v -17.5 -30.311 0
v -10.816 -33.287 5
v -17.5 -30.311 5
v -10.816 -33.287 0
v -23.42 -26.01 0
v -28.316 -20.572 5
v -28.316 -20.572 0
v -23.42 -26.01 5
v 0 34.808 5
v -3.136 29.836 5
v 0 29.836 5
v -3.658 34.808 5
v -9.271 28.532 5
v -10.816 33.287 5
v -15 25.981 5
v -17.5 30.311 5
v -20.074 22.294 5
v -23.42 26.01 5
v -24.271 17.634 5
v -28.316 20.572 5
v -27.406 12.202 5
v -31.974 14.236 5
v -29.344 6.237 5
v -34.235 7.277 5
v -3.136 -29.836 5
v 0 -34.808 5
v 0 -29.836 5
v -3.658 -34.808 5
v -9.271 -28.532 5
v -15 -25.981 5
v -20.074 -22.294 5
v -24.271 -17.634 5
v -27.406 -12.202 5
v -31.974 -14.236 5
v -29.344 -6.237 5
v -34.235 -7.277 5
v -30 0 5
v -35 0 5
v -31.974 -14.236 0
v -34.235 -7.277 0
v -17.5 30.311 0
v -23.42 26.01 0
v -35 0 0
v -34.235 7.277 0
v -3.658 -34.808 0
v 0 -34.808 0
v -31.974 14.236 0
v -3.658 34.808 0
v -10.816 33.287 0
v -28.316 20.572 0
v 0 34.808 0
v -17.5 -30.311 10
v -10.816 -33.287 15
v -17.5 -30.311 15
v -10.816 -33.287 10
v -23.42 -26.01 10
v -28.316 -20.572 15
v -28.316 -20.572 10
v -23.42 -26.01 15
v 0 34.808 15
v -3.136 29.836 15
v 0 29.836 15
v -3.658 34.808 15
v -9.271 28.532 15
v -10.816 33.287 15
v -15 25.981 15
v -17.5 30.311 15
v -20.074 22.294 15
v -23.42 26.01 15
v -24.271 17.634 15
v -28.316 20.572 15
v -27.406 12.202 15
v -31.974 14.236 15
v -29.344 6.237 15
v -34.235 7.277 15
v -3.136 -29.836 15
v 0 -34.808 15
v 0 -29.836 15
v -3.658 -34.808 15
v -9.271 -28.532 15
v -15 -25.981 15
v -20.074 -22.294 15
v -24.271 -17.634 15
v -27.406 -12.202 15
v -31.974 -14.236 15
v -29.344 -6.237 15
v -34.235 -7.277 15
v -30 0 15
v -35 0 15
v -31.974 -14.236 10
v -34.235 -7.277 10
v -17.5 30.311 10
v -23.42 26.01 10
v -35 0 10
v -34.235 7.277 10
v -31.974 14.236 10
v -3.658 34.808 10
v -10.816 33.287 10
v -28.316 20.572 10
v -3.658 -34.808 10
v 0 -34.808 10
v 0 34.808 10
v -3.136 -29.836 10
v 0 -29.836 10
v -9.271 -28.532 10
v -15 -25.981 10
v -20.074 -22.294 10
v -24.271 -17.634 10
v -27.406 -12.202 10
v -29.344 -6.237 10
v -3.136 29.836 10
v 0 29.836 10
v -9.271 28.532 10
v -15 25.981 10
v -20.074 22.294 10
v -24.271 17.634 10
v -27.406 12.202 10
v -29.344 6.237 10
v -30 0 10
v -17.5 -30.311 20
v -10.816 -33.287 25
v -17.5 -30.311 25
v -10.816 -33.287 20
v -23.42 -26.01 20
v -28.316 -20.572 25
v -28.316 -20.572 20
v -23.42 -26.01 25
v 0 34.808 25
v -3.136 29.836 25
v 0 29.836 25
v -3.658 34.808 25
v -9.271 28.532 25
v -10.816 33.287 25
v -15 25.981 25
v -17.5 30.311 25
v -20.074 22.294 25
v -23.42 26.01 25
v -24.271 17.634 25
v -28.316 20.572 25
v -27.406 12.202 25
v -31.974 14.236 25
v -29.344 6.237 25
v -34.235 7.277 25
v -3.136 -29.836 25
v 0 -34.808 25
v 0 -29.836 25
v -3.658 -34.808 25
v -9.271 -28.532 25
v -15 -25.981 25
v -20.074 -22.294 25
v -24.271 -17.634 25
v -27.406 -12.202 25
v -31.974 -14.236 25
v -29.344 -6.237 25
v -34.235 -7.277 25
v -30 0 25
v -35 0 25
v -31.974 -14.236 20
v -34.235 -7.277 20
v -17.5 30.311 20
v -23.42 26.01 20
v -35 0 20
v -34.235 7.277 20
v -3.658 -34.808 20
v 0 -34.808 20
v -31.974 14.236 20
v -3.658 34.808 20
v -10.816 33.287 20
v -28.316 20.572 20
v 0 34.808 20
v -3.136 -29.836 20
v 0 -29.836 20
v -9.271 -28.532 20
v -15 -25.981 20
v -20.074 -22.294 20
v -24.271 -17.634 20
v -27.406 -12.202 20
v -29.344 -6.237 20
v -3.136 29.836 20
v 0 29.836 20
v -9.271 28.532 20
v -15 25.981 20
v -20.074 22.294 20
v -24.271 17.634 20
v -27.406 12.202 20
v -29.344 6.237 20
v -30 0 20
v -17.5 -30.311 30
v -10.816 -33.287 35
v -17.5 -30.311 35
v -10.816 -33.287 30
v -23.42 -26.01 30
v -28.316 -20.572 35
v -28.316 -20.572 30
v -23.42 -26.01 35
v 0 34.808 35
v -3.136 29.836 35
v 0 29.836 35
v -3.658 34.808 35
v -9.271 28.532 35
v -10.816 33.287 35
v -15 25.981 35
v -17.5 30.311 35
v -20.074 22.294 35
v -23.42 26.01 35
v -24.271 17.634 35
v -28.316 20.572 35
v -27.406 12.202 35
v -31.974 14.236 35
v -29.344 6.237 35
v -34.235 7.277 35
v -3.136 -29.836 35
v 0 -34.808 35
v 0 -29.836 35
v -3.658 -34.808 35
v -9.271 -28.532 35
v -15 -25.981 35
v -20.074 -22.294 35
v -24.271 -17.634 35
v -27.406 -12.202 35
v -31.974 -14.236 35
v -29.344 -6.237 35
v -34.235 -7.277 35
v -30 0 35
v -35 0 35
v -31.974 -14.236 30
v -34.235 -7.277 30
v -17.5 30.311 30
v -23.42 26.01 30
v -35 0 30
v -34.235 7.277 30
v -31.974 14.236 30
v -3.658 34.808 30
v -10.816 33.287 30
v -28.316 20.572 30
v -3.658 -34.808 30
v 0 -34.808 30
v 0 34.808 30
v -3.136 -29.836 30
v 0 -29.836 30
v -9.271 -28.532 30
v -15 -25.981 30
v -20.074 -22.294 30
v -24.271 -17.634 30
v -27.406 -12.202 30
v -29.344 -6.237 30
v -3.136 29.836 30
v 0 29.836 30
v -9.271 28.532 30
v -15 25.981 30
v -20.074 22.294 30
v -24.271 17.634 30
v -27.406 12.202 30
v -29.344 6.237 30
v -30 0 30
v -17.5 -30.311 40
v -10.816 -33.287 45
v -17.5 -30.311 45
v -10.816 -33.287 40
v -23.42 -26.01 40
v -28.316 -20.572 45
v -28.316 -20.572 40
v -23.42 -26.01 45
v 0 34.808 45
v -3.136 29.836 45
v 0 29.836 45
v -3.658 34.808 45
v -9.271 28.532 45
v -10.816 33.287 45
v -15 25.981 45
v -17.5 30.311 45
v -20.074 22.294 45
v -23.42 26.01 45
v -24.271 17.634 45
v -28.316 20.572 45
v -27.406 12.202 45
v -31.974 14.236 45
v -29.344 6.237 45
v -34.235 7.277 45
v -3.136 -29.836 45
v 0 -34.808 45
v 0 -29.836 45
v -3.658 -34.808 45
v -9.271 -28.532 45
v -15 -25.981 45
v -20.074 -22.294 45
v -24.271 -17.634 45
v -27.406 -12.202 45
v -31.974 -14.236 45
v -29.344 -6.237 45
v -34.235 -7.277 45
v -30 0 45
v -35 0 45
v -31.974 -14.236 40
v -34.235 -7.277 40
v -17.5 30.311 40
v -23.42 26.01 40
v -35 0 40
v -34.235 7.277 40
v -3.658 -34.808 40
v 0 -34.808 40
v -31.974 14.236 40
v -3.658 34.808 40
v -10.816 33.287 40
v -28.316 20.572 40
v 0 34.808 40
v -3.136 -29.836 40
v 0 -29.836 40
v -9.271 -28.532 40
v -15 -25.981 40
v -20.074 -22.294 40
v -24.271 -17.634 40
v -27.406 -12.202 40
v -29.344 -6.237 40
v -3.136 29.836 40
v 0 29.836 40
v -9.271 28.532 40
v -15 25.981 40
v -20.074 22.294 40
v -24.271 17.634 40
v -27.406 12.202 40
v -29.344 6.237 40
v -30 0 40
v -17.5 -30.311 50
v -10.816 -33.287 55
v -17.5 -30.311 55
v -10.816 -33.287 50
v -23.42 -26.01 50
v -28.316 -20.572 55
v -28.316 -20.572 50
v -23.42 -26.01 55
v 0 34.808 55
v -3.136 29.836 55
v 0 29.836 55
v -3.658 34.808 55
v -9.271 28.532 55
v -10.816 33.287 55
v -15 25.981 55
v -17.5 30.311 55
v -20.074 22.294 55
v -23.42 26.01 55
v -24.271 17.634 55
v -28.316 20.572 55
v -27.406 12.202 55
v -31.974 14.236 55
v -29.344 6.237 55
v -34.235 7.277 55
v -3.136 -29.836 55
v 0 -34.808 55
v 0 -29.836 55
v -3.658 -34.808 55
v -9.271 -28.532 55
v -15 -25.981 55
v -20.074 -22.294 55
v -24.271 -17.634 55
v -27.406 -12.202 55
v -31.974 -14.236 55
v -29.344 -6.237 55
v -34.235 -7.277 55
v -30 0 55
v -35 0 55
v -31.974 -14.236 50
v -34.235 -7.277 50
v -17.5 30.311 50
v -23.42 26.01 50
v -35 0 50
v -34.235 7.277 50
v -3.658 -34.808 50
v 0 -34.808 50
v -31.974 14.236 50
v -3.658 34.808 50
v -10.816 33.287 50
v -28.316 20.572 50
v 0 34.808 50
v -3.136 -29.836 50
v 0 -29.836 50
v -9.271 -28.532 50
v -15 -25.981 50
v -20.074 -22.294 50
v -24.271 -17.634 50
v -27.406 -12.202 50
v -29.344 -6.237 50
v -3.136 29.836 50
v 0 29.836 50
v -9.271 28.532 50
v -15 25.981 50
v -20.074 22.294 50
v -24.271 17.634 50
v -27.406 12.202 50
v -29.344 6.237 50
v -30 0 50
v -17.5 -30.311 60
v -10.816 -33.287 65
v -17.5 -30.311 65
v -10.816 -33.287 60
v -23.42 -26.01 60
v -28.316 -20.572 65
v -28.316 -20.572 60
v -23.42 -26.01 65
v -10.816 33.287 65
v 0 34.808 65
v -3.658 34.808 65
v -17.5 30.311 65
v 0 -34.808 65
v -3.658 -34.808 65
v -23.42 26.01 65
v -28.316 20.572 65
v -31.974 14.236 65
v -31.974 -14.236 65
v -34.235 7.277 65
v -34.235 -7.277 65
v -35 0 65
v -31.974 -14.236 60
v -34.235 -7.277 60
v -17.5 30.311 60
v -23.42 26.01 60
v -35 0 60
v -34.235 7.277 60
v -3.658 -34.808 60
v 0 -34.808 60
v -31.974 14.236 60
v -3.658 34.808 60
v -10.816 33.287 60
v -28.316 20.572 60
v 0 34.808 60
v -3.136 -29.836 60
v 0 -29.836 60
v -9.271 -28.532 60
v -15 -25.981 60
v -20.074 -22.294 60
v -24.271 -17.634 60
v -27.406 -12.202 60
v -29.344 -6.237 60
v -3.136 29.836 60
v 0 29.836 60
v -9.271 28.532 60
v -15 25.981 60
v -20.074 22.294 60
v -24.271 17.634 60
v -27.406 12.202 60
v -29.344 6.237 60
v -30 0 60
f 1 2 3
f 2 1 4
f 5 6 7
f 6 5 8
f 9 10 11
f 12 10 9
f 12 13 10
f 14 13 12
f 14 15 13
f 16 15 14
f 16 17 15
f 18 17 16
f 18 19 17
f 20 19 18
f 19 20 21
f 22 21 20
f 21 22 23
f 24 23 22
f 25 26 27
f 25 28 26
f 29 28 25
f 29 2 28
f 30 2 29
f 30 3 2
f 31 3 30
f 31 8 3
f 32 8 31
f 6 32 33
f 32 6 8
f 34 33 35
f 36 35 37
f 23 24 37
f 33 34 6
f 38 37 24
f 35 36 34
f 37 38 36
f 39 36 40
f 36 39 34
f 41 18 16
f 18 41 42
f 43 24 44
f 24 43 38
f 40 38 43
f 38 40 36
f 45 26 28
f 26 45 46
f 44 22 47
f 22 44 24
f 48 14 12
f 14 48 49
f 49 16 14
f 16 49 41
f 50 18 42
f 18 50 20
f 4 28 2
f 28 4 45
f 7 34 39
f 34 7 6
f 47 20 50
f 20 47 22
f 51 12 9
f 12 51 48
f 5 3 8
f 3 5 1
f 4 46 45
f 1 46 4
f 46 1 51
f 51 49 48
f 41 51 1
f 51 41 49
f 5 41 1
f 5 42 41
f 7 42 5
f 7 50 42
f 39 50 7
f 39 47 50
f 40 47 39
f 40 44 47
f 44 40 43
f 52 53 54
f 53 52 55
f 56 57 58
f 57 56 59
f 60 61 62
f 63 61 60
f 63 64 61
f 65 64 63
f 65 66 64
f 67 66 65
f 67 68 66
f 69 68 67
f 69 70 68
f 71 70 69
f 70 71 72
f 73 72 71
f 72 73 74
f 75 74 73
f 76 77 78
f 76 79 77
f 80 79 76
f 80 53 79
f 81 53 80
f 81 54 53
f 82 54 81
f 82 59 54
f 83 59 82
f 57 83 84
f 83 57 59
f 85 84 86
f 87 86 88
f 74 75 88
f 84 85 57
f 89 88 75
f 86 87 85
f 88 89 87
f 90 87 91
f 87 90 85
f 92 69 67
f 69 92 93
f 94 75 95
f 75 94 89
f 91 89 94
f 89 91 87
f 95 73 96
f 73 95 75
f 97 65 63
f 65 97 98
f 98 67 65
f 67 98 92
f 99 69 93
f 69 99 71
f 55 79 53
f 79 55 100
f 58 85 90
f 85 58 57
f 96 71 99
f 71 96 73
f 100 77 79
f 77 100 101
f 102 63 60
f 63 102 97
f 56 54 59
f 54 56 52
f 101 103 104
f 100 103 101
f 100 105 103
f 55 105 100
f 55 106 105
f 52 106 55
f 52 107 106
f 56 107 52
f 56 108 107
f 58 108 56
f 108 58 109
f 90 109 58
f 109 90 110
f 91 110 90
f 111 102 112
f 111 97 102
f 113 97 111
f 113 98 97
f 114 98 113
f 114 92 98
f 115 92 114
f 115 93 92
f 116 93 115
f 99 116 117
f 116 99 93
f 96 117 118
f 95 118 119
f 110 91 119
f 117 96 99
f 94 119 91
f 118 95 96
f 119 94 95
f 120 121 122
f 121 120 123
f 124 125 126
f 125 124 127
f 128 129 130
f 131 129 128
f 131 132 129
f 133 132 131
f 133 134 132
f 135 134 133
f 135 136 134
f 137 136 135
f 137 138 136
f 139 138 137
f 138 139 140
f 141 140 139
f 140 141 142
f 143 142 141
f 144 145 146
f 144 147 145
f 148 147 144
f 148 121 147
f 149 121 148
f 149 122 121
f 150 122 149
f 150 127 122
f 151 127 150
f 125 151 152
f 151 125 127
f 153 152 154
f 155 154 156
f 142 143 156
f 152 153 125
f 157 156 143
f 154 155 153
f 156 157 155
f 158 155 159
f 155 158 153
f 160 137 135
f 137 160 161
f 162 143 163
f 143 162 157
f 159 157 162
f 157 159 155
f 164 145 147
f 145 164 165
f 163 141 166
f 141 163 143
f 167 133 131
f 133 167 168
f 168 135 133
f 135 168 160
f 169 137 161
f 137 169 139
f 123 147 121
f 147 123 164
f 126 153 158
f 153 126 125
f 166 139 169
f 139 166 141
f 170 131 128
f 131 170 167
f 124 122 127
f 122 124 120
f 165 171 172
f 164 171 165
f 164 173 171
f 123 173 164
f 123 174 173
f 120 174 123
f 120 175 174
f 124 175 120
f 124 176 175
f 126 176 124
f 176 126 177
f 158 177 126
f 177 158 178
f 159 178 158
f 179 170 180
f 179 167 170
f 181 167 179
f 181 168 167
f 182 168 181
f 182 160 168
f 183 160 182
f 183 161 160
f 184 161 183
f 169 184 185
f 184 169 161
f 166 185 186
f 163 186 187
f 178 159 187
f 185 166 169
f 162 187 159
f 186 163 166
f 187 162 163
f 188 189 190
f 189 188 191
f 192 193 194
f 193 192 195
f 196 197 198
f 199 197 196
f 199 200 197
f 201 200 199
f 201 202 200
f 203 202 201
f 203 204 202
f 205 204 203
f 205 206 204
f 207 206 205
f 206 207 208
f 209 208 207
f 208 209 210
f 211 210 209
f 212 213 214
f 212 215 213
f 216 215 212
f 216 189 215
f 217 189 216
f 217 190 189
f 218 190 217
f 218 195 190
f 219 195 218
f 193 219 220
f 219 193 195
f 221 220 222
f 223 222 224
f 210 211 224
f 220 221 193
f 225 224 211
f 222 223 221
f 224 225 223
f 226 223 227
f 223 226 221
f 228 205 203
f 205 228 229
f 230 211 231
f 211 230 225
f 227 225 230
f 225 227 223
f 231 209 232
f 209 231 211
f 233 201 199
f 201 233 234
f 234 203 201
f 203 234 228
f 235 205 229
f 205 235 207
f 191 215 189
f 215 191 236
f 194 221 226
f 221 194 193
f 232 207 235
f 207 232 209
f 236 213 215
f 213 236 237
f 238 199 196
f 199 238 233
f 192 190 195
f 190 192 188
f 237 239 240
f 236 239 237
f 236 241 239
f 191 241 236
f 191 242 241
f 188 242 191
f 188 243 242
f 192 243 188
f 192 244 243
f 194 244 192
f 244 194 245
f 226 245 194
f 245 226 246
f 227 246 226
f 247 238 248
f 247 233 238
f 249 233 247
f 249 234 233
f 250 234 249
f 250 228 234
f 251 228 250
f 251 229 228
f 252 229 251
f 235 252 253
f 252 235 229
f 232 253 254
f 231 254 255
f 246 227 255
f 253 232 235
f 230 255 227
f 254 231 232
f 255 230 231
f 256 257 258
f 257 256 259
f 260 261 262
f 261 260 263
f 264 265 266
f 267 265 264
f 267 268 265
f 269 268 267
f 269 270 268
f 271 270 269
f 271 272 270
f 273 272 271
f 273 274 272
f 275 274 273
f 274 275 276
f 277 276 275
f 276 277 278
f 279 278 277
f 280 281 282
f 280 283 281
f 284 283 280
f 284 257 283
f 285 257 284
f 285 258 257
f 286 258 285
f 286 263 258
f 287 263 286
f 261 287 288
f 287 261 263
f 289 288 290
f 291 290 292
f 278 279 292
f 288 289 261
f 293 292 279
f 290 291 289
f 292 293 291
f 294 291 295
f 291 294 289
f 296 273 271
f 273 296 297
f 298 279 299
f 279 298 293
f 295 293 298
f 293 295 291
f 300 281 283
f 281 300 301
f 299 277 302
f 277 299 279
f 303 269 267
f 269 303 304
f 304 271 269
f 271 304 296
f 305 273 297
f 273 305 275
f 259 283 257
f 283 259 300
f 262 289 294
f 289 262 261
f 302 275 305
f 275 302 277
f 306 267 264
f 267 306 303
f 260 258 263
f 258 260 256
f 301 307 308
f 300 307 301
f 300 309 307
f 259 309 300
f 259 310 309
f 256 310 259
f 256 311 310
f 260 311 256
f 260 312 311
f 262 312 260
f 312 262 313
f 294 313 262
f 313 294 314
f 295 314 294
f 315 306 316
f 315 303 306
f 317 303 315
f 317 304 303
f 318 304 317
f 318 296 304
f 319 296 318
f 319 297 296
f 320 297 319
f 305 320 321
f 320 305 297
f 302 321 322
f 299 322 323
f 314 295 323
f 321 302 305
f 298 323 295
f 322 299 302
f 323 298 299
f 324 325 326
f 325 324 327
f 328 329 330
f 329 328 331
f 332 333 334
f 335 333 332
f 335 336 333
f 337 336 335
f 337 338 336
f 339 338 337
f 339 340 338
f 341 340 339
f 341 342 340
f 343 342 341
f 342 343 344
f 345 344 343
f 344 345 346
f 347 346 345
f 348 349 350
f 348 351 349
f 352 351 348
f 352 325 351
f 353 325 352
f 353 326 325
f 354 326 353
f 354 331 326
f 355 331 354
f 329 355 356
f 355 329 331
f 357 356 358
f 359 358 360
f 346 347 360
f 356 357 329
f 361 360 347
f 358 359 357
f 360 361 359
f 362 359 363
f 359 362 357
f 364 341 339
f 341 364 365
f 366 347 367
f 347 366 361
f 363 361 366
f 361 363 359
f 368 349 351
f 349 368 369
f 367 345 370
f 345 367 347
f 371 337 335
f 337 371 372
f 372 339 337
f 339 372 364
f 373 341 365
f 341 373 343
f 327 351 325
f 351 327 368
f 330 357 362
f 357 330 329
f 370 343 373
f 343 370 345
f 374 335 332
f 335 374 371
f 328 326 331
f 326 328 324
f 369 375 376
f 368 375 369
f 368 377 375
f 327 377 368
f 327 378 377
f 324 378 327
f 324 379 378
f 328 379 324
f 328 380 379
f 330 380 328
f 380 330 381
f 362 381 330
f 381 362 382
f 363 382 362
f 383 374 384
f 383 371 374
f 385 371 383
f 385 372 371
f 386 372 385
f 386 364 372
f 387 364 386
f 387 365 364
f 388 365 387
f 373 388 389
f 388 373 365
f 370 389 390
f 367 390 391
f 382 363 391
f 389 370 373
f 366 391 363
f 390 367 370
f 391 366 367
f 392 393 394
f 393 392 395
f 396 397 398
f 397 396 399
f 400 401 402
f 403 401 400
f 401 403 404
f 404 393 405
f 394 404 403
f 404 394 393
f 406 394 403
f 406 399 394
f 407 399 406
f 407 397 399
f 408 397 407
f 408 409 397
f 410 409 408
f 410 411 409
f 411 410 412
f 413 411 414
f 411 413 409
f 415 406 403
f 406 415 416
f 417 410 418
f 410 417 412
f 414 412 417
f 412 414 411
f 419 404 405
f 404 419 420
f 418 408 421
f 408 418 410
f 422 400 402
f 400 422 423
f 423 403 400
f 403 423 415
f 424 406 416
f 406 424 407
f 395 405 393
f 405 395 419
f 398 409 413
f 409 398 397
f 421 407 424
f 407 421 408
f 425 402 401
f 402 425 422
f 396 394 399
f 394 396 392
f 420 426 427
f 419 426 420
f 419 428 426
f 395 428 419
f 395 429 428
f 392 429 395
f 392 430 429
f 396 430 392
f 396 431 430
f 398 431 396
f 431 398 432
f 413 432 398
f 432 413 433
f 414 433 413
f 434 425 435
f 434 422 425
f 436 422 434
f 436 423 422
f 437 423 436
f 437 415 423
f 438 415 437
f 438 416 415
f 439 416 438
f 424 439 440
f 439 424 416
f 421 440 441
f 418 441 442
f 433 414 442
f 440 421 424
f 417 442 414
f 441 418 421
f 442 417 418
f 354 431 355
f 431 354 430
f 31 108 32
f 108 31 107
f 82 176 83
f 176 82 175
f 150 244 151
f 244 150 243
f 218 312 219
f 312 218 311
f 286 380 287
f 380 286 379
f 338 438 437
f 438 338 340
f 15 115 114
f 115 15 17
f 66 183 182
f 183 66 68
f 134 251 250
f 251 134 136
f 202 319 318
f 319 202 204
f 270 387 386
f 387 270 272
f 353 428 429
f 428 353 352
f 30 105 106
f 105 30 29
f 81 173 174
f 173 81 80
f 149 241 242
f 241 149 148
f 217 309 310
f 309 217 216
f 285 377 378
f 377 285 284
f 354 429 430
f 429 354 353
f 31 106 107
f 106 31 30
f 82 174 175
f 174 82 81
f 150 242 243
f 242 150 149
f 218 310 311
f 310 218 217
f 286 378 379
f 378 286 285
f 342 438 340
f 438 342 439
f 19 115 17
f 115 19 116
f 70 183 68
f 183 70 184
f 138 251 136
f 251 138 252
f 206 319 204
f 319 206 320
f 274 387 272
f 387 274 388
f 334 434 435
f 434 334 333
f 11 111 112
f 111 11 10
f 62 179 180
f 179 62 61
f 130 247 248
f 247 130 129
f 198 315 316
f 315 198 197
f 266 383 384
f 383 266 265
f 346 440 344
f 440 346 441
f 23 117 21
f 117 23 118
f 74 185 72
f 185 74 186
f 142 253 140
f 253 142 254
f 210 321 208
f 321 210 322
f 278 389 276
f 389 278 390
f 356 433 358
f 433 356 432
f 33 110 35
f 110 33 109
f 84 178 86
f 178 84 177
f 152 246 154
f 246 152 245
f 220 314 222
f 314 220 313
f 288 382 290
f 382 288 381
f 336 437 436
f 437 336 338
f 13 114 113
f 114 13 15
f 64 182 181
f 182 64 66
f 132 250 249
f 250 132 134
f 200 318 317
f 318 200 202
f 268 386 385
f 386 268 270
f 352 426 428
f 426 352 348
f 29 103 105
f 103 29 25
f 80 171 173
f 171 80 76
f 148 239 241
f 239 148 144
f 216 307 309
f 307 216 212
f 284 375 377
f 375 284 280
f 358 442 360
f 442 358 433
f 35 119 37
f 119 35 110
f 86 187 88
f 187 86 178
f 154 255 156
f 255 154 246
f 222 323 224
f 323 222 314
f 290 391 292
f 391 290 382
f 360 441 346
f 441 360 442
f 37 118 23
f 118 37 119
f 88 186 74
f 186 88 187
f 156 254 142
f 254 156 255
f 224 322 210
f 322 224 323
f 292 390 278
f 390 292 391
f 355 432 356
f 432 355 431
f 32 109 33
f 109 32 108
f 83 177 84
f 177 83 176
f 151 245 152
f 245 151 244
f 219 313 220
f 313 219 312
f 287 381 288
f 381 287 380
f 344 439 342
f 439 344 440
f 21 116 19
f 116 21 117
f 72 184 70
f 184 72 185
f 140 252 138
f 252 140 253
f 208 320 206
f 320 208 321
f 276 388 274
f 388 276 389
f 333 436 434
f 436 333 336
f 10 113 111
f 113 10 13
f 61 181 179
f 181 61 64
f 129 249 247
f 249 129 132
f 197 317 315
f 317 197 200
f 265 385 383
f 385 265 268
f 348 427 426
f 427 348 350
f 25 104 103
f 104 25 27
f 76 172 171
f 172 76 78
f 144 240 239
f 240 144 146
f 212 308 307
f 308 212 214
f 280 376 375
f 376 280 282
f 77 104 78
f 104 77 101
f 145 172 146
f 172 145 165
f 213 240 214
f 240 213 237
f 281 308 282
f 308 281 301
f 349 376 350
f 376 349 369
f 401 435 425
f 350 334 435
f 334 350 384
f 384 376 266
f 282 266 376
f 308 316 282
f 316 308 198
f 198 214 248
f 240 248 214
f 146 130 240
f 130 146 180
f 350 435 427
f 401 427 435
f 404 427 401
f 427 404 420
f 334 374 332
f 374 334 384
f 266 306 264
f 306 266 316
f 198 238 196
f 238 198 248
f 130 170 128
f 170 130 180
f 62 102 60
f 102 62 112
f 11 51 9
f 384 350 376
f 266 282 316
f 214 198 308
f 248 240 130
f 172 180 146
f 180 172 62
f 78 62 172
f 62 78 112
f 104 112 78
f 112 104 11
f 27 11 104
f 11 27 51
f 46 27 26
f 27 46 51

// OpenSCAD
// file: ../heat-sink.scad
module heatSink(finHeight = 5,
                height = 60,
                innerRadius = 30,
                outerRadiusAdustment = 5)
{
    union()
    {
        // core
        color("black")
        cylinder(h = height,
                 r = innerRadius);

        // fins
        outerRadius = innerRadius + outerRadiusAdustment;

        for(i = [0 : 6]) 
        {
            zTranslate = i  * finHeight * 2;

            color("silver")
            translate([0,0,zTranslate])
            cylinder(h = finHeight,
                     r = outerRadius);
        }
    }
}
// main file
use <../heat-sink.scad>

difference()
{
    heatSink();

    cutoutSize = 95;
    translate([0, -cutoutSize / 2.0, -0.01])
    cube(size = [cutoutSize, cutoutSize,85]);
}
